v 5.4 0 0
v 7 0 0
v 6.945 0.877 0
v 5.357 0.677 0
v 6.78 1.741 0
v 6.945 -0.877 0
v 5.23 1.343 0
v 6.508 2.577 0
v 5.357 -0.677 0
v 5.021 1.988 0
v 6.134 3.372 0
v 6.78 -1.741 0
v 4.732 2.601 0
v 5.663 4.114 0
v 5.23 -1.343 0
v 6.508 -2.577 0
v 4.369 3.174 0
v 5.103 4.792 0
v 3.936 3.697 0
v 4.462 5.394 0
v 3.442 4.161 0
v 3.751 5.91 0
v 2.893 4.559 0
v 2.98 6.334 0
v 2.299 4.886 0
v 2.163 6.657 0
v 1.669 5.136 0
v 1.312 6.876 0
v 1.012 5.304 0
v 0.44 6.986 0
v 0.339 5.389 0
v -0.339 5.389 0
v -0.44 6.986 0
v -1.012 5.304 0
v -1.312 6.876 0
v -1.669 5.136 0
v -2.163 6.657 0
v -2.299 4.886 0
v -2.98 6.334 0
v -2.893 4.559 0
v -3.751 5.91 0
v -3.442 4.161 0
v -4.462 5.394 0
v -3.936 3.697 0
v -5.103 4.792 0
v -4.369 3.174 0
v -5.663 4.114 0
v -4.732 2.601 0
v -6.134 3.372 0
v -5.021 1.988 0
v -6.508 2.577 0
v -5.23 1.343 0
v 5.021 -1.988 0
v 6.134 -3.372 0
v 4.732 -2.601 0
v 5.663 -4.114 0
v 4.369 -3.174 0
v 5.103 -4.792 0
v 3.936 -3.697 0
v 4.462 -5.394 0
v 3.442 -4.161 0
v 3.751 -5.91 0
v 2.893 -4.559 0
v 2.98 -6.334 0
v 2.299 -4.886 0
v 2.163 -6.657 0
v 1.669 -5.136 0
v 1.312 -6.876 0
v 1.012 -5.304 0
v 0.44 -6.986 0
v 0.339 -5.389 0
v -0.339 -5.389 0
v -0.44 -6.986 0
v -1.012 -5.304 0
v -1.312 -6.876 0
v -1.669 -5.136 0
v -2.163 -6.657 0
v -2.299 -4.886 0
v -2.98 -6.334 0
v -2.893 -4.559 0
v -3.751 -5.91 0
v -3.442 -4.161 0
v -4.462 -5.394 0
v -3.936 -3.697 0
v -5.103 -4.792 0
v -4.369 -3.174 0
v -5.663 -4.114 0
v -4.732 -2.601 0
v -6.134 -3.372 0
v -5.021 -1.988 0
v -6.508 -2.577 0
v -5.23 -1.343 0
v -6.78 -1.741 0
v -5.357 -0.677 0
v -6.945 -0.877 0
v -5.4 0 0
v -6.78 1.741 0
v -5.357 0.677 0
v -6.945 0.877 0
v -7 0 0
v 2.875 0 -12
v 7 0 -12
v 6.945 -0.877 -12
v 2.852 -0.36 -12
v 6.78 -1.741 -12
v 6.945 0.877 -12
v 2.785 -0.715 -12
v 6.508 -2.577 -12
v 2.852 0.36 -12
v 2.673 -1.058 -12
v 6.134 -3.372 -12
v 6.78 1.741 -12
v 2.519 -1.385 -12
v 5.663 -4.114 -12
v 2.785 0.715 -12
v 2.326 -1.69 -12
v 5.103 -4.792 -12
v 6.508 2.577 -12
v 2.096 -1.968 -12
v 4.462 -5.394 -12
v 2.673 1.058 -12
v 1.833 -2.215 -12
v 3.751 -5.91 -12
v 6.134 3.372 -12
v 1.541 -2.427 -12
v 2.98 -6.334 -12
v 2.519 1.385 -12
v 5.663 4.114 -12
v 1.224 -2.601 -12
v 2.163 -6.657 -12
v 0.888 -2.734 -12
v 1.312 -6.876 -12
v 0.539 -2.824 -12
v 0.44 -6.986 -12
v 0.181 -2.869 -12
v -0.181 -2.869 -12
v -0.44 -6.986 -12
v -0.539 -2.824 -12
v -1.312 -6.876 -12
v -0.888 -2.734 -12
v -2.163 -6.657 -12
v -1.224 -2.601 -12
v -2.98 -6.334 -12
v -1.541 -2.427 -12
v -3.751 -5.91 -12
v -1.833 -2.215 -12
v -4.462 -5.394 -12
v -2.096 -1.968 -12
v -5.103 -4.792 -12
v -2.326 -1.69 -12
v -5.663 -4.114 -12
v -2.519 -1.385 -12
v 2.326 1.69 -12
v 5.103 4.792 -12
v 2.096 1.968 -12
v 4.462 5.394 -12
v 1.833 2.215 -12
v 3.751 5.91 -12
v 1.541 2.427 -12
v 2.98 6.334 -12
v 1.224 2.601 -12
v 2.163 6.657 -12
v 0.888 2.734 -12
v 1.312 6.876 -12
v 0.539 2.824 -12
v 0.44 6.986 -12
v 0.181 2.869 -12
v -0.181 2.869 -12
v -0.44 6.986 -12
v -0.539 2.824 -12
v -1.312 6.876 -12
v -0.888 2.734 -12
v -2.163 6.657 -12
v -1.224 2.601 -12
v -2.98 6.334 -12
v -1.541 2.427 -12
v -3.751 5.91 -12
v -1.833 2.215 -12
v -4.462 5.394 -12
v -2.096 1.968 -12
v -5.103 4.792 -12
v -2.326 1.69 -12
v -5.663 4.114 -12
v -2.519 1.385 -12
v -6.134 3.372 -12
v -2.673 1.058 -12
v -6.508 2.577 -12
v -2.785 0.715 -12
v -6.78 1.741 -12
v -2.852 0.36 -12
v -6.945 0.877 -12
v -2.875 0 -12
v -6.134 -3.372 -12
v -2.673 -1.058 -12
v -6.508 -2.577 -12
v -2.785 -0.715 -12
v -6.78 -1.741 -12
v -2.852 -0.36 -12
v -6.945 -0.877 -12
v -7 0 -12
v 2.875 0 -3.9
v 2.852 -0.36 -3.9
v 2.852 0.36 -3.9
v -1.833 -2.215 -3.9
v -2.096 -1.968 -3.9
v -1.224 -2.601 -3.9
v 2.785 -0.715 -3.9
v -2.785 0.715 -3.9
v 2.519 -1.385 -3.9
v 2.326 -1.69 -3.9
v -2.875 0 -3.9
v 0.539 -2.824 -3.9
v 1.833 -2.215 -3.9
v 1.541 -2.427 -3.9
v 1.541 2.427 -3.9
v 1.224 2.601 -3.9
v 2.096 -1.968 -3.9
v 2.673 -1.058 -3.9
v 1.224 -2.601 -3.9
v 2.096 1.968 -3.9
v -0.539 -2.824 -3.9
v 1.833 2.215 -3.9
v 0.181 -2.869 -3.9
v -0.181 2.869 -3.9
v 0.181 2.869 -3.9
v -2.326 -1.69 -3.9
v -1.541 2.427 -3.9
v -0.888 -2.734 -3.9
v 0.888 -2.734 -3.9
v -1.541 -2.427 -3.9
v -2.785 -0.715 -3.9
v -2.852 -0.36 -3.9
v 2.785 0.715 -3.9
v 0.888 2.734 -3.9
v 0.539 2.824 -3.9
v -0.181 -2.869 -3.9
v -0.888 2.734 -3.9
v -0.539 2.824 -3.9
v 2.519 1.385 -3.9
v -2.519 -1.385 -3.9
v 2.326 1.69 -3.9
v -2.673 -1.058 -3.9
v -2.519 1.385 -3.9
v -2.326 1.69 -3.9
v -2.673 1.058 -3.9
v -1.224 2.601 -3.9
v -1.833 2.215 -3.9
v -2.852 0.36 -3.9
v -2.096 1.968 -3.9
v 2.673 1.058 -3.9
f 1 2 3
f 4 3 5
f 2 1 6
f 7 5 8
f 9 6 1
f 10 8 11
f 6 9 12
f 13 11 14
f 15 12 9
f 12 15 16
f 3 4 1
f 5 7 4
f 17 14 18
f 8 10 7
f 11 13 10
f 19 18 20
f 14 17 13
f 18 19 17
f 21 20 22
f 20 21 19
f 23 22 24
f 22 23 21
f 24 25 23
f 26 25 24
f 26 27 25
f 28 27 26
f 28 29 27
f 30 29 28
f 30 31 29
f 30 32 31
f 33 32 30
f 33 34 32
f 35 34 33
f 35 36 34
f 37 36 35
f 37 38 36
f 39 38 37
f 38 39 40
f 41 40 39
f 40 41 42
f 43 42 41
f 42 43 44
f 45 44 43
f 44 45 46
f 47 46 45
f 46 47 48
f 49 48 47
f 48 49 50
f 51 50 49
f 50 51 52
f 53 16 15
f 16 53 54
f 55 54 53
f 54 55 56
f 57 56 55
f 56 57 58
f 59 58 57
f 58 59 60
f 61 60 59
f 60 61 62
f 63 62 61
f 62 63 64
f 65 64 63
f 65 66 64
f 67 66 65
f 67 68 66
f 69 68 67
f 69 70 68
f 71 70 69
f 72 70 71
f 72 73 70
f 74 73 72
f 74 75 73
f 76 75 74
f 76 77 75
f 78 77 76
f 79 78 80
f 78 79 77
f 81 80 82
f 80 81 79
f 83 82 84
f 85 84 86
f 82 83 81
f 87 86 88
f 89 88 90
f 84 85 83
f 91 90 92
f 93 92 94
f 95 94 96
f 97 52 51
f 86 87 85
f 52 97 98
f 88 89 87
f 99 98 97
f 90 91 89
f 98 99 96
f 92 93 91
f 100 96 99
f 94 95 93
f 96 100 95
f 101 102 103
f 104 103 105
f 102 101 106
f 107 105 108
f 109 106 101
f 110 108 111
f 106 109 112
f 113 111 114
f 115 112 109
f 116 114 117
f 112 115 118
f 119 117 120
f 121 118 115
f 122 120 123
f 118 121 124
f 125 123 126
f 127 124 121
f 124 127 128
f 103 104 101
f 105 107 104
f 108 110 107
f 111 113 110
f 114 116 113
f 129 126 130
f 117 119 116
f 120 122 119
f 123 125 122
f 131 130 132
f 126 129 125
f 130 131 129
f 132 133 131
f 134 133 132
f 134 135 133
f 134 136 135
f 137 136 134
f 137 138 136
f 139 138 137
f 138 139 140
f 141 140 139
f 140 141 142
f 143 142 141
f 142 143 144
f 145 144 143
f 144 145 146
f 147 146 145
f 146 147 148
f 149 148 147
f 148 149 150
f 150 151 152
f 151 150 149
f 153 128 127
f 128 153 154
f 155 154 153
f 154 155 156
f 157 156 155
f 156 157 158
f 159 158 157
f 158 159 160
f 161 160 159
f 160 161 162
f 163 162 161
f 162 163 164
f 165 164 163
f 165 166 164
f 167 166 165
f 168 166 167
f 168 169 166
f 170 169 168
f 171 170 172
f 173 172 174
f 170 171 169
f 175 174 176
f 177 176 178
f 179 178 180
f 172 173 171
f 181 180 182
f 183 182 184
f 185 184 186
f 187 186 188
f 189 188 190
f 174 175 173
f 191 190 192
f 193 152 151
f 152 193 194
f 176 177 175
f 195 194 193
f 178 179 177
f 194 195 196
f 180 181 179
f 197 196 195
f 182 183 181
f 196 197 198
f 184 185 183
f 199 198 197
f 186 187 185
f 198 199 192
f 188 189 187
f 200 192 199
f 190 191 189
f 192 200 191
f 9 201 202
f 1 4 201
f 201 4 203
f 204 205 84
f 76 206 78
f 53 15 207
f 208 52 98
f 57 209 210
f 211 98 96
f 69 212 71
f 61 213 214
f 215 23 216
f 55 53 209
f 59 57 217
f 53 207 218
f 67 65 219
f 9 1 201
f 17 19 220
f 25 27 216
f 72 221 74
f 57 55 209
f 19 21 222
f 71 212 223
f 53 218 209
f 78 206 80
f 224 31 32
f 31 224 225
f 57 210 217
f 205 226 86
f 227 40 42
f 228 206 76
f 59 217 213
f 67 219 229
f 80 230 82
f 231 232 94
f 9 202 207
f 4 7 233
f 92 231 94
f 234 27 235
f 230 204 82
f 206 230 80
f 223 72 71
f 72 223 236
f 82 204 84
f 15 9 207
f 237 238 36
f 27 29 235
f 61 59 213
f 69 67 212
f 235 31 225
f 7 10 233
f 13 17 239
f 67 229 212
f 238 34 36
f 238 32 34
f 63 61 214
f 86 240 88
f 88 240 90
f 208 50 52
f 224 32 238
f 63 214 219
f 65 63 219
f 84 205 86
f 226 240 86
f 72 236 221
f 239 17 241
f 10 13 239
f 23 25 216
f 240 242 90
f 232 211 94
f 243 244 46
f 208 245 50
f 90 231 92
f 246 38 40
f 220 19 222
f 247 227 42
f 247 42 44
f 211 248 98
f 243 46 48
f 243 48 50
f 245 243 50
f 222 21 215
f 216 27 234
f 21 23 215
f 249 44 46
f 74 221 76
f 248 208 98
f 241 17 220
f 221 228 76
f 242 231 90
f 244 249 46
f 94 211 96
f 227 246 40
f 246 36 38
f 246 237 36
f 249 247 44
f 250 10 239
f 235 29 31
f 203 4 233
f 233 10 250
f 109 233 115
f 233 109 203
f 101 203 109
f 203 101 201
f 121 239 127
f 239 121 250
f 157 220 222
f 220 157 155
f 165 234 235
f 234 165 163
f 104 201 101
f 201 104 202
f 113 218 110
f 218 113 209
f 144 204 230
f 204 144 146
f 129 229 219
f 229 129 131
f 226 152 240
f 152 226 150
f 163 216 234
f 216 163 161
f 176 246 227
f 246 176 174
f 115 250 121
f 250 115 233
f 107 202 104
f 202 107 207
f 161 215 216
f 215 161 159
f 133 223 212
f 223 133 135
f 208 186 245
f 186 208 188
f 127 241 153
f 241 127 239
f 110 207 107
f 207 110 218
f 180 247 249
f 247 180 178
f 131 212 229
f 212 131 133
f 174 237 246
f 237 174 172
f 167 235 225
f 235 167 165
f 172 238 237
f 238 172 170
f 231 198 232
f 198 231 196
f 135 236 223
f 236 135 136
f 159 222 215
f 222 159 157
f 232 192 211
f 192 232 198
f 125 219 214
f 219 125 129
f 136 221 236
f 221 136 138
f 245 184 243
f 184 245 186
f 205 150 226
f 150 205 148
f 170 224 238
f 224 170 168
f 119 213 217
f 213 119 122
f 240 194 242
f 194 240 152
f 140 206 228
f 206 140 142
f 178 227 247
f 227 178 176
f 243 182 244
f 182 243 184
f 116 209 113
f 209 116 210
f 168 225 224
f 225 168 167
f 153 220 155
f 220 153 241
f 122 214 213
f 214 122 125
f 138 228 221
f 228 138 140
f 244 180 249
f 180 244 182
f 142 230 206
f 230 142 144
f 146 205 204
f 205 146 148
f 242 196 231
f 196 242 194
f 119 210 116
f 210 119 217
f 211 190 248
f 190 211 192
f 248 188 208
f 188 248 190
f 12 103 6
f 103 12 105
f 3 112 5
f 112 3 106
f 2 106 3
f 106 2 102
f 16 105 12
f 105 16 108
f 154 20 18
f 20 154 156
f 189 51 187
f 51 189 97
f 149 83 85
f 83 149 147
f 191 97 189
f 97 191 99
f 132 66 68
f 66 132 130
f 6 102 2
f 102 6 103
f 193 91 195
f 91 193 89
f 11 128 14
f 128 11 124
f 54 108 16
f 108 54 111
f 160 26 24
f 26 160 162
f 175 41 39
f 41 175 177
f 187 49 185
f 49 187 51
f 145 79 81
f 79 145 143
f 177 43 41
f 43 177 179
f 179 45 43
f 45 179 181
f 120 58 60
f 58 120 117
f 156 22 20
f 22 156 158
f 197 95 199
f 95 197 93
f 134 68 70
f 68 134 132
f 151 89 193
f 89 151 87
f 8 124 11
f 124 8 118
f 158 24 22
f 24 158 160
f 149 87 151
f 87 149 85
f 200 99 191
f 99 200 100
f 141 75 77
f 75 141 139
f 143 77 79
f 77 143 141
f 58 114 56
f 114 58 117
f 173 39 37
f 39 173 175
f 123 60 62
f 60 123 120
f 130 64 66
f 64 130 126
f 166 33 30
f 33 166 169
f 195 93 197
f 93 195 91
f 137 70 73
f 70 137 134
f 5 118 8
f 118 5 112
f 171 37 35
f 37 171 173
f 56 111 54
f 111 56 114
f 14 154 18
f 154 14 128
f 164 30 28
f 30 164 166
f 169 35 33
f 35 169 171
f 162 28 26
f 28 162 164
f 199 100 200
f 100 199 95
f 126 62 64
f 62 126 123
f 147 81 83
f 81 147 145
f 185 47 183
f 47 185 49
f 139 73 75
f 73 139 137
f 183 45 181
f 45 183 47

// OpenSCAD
$fn = 50;


difference() {
	union() {
		translate(v = [0, 0, -12.0000000000]) {
			cylinder(h = 12, r = 7.0000000000);
		}
	}
	union() {
		translate(v = [0, 0, 0]) {
			rotate(a = [0, 0, 0]) {
				difference() {
					union() {
						#translate(v = [0, 0, -12.0000000000]) {
							cylinder(h = 12, r = 2.6000000000);
						}
						#translate(v = [0, 0, -3.9000000000]) {
							cylinder(h = 3.9000000000, r1 = 2.8750000000, r2 = 5.4000000000);
						}
						#translate(v = [0, 0, -12.0000000000]) {
							cylinder(h = 12, r = 2.8750000000);
						}
						#translate(v = [0, 0, -12.0000000000]) {
							cylinder(h = 12, r = 2.6000000000);
						}
					}
					union();
				}
			}
		}
	}
}
